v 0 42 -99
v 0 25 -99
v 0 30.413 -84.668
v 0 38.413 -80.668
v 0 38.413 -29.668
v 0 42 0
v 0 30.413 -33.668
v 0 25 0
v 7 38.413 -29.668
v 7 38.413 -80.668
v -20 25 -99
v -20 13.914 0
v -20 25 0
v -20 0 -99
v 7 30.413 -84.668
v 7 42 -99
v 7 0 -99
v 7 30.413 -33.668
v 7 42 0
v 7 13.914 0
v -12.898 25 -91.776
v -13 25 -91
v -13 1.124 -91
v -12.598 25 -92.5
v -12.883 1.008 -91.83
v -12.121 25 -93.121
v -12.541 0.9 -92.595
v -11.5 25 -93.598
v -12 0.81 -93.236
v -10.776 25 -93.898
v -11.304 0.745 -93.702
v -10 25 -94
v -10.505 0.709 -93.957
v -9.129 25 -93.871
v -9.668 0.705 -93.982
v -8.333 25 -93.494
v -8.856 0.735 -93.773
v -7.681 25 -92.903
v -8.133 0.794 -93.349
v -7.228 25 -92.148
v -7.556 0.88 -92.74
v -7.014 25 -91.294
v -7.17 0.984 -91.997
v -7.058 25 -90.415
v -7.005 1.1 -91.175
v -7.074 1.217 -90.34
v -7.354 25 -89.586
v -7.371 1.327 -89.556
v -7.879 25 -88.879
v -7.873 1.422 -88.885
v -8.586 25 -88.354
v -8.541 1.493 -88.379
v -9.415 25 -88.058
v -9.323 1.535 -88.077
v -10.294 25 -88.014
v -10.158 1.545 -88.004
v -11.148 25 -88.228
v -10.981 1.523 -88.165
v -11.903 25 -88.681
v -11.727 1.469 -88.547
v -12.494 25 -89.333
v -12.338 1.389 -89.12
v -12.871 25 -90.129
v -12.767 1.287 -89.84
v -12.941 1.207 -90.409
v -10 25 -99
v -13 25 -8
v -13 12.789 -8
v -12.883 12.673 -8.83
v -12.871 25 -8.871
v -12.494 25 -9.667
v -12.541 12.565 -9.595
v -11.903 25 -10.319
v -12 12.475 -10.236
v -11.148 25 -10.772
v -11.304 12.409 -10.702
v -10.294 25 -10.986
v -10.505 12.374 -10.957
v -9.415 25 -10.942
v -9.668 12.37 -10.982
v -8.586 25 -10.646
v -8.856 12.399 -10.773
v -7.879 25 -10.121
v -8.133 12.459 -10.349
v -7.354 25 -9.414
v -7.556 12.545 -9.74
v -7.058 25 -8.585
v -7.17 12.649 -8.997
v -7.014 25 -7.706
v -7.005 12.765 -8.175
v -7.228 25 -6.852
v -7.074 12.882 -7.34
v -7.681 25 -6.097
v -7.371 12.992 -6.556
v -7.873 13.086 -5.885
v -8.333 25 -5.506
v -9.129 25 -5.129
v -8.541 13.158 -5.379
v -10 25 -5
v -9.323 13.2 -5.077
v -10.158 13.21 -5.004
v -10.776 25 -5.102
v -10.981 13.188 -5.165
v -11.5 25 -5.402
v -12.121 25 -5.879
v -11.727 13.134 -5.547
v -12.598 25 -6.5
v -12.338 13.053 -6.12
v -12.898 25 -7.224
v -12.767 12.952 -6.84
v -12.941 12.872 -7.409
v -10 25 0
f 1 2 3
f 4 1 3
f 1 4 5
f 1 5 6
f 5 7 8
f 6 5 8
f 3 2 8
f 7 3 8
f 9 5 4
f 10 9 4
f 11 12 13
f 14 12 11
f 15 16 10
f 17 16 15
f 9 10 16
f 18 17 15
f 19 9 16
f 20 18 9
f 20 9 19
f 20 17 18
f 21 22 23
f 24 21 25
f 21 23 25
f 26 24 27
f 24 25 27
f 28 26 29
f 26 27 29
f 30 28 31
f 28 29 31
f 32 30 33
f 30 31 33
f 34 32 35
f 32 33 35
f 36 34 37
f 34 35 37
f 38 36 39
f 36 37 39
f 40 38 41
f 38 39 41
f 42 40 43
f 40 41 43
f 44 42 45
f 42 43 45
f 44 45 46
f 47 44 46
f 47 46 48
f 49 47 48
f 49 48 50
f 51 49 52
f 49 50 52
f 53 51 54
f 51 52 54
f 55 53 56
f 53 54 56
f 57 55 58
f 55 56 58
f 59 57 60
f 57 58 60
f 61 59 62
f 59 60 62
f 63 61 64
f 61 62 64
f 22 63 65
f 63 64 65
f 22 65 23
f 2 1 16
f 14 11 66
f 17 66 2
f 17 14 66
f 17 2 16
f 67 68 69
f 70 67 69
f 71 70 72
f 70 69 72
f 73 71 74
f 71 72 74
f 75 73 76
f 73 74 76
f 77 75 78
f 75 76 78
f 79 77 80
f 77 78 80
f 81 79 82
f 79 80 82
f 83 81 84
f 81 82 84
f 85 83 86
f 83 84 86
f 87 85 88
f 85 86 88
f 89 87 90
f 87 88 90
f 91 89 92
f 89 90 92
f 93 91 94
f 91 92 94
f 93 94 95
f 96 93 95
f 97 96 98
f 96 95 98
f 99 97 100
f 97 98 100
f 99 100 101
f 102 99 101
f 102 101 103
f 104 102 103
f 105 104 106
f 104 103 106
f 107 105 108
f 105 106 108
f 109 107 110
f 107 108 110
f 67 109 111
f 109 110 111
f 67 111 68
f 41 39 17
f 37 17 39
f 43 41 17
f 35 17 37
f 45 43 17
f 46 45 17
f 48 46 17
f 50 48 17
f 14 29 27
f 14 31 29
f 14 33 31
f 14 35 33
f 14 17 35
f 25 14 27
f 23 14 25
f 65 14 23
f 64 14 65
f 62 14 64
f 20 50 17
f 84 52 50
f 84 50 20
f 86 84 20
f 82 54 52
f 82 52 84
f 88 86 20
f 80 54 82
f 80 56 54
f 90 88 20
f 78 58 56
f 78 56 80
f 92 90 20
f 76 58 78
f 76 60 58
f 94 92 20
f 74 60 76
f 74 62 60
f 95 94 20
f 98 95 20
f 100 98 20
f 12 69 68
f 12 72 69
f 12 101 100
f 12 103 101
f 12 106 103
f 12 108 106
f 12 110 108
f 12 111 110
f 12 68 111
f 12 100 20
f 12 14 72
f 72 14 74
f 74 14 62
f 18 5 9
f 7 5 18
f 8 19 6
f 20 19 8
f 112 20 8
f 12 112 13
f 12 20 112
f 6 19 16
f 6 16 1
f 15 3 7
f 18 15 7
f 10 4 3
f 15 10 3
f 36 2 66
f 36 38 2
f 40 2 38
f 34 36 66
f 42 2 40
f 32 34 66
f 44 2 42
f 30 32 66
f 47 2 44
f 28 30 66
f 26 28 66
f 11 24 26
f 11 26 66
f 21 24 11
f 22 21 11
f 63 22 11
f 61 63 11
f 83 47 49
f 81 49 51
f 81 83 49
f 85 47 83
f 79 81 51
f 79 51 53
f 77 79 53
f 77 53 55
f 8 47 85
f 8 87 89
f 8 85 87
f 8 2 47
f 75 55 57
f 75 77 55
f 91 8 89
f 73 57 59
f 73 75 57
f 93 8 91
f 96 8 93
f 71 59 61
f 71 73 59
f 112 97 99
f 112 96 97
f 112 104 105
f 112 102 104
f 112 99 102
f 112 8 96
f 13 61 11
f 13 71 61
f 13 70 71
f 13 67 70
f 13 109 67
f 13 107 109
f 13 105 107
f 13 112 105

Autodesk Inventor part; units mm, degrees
ref_plane "YZ Plane" through (0, 0, 0) normal (1, 0, 0) x (0, 1, 0)
ref_plane "XZ Plane" through (0, 0, 0) normal (0, 1, 0) x (-1, 0, 0)
ref_plane "XY Plane" through (0, 0, 0) normal (0, 0, 1) x (1, 0, 0)
sketch "Sketch1" plane through (0, 0, 0) normal (0, 1, 0) x (-1, 0, 0)
  line L0 (0, 0) -> (20, 0)
  line L1 (20, 0) -> (20, -99)
  line L2 (20, -99) -> (0, -99)
  line L3 (0, -99) -> (0, 0)
  line L4 (10, 0) -> (10, -8)
  circle A0 centre (10, -8) radius 3
  line L5 (10, -99) -> (10, -91)
  circle A1 centre (10, -91) radius 3
  line L6 (0, -99) -> (-7, -99)
  line L7 (-7, -99) -> (-7, 0)
  line L8 (-7, 0) -> (0, 0)
  line L9 (0, 0) -> (0, -99)
  dimension "d0" = 20
  dimension "d1" = 99
  dimension "d2" = 8
  dimension "d3" = 6
  dimension "d4" = 8
  dimension "d5" = 6
  dimension "d8" = 7
extrude "Extrusion1" add sketch "Sketch1" along normal blind 25 contours L0 L1 L2 L3
extrude "Extrusion2" add sketch "Sketch1" along normal blind 42 contours L3 L6 L7 L8
sketch "Sketch2" plane through (0, 25, 0) normal (-1, 0, 0) x (0, 0, 1)
  line L0 (-84.6677, 5.4134) -> (-33.6677, 5.4134)
  line L1 (-33.6677, 5.4134) -> (-33.6677, 13.4134)
  line L2 (0, 17) -> (-99, 17) projected
  line L3 (-33.6677, 13.4134) -> (-29.6677, 13.4134)
  line L4 (-29.6677, 13.4134) -> (-80.6677, 13.4134)
  line L5 (-80.6677, 13.4134) -> (-84.6677, 5.4134)
  line L6 (-29.6677, 13.4134) -> (-33.6677, 5.4134)
  point P0 (0, -25)
  point P1 (-33.6677, 13.4134)
  dimension "d11" = 51
  dimension "d12" = 8
  dimension "d13" = 4
  dimension "d14" = 51
extrude "Extrusion3" cut sketch "Sketch2" against normal through all
sketch "Sketch3" plane through (-20, 0, -99) normal (-1, 0, 0) x (0, 0, 1)
  line L0 (0, 0) -> (99, 13.9135)
  line L1 (99, 0) -> (99, 42) projected
  line L2 (0, 0) -> (99.9729, 0) construction
  line L3 (99, 13.9135) -> (99, 0)
  line L4 (99, 0) -> (0, 0)
  dimension "d17" = 8
extrude "Extrusion4" cut sketch "Sketch3" against normal through all
properties part number "Podkladki_pod_laptopa"
